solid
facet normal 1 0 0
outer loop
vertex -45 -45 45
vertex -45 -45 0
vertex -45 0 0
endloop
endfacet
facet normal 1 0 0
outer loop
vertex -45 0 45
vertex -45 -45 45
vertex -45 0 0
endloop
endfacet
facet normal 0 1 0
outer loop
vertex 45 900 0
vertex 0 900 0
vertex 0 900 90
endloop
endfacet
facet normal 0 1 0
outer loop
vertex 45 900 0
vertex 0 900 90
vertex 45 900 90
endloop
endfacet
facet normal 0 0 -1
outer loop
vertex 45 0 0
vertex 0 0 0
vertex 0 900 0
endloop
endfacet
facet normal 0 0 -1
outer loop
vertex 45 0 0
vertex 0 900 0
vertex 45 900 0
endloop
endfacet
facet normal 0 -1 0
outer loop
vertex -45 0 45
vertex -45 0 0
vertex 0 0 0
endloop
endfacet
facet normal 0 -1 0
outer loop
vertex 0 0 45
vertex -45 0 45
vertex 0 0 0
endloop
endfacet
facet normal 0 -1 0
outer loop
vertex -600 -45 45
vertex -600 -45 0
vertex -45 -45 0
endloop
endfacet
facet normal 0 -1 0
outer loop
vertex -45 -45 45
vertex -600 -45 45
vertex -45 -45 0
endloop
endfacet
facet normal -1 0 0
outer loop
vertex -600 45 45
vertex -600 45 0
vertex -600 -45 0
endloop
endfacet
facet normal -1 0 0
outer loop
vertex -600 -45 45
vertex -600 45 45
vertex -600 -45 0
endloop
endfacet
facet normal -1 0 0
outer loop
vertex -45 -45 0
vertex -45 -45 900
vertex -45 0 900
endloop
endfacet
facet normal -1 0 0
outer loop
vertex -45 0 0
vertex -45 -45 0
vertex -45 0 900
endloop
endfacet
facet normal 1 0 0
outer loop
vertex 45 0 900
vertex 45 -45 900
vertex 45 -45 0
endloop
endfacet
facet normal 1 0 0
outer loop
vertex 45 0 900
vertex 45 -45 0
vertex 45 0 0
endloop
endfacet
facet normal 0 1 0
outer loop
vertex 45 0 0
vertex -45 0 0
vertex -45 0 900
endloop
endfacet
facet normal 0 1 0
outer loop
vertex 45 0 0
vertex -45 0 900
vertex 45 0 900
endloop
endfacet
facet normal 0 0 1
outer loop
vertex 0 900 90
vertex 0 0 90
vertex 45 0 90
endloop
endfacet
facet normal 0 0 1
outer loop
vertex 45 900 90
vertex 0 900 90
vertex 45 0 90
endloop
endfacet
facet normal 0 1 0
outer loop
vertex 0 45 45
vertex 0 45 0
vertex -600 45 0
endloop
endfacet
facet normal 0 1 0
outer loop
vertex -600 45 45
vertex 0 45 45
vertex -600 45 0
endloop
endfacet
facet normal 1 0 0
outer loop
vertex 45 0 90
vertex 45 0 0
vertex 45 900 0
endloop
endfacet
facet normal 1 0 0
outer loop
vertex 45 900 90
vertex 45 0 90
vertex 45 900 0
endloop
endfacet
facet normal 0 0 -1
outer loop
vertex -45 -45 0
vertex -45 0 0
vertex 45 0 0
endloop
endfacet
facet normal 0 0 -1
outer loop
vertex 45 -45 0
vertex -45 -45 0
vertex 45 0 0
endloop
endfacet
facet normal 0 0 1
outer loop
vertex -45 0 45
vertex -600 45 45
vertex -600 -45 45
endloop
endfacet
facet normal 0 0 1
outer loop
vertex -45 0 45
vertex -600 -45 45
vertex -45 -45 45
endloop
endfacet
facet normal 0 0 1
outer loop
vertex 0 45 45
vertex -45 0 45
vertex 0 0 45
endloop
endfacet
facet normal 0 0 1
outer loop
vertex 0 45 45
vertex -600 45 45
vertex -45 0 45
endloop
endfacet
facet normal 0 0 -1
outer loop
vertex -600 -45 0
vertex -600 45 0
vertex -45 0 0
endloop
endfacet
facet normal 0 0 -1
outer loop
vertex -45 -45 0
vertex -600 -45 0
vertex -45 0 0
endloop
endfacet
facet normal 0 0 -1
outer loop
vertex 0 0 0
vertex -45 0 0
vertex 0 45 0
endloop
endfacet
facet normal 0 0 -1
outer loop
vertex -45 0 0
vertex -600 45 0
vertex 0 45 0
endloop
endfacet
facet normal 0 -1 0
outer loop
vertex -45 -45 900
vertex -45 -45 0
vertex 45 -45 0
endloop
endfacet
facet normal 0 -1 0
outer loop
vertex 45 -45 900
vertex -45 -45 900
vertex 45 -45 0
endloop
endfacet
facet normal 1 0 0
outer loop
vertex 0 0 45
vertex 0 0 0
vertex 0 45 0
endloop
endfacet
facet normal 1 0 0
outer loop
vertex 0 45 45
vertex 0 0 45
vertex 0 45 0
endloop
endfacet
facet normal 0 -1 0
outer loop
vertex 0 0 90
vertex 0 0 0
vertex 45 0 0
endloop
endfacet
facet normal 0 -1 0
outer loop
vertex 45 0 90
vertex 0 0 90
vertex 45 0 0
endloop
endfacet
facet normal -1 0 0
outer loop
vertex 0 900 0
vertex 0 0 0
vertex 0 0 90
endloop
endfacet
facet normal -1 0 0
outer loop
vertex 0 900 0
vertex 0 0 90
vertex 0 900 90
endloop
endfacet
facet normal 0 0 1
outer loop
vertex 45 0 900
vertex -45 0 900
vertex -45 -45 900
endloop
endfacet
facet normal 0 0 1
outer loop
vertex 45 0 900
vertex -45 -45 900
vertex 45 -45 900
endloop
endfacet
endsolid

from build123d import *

# Parameters (mm, degrees)
F0_W     = 45
F0_H     = 900
F1_DEPTH = 90
F2_W     = 90
F2_H     = 45
F3_DEPTH = 900
F5_DEPTH = 45


with BuildPart() as f1:
    # F0 (on Top) → F1 (new body)
    with BuildSketch(Plane.XY):
        with Locations((22.5, 450)):
            Rectangle(F0_W, F0_H)
    extrude(amount=F1_DEPTH)


with BuildPart() as f3:
    # F2 (on Top) → F3 (new body)
    with BuildSketch(Plane.XY):
        with Locations((0, -22.5)):
            Rectangle(F2_W, F2_H)
    extrude(amount=F3_DEPTH)


with BuildPart() as f5:
    # F4 (on Top) → F5 (new body)
    with BuildSketch(Plane.XY):
        Polygon((0, 0), (0, 45), (-600, 45), (-600, -45), (-45, -45), (-45, 0), align=None)
    extrude(amount=F5_DEPTH)


solid = Compound([f1.part, f3.part, f5.part])
